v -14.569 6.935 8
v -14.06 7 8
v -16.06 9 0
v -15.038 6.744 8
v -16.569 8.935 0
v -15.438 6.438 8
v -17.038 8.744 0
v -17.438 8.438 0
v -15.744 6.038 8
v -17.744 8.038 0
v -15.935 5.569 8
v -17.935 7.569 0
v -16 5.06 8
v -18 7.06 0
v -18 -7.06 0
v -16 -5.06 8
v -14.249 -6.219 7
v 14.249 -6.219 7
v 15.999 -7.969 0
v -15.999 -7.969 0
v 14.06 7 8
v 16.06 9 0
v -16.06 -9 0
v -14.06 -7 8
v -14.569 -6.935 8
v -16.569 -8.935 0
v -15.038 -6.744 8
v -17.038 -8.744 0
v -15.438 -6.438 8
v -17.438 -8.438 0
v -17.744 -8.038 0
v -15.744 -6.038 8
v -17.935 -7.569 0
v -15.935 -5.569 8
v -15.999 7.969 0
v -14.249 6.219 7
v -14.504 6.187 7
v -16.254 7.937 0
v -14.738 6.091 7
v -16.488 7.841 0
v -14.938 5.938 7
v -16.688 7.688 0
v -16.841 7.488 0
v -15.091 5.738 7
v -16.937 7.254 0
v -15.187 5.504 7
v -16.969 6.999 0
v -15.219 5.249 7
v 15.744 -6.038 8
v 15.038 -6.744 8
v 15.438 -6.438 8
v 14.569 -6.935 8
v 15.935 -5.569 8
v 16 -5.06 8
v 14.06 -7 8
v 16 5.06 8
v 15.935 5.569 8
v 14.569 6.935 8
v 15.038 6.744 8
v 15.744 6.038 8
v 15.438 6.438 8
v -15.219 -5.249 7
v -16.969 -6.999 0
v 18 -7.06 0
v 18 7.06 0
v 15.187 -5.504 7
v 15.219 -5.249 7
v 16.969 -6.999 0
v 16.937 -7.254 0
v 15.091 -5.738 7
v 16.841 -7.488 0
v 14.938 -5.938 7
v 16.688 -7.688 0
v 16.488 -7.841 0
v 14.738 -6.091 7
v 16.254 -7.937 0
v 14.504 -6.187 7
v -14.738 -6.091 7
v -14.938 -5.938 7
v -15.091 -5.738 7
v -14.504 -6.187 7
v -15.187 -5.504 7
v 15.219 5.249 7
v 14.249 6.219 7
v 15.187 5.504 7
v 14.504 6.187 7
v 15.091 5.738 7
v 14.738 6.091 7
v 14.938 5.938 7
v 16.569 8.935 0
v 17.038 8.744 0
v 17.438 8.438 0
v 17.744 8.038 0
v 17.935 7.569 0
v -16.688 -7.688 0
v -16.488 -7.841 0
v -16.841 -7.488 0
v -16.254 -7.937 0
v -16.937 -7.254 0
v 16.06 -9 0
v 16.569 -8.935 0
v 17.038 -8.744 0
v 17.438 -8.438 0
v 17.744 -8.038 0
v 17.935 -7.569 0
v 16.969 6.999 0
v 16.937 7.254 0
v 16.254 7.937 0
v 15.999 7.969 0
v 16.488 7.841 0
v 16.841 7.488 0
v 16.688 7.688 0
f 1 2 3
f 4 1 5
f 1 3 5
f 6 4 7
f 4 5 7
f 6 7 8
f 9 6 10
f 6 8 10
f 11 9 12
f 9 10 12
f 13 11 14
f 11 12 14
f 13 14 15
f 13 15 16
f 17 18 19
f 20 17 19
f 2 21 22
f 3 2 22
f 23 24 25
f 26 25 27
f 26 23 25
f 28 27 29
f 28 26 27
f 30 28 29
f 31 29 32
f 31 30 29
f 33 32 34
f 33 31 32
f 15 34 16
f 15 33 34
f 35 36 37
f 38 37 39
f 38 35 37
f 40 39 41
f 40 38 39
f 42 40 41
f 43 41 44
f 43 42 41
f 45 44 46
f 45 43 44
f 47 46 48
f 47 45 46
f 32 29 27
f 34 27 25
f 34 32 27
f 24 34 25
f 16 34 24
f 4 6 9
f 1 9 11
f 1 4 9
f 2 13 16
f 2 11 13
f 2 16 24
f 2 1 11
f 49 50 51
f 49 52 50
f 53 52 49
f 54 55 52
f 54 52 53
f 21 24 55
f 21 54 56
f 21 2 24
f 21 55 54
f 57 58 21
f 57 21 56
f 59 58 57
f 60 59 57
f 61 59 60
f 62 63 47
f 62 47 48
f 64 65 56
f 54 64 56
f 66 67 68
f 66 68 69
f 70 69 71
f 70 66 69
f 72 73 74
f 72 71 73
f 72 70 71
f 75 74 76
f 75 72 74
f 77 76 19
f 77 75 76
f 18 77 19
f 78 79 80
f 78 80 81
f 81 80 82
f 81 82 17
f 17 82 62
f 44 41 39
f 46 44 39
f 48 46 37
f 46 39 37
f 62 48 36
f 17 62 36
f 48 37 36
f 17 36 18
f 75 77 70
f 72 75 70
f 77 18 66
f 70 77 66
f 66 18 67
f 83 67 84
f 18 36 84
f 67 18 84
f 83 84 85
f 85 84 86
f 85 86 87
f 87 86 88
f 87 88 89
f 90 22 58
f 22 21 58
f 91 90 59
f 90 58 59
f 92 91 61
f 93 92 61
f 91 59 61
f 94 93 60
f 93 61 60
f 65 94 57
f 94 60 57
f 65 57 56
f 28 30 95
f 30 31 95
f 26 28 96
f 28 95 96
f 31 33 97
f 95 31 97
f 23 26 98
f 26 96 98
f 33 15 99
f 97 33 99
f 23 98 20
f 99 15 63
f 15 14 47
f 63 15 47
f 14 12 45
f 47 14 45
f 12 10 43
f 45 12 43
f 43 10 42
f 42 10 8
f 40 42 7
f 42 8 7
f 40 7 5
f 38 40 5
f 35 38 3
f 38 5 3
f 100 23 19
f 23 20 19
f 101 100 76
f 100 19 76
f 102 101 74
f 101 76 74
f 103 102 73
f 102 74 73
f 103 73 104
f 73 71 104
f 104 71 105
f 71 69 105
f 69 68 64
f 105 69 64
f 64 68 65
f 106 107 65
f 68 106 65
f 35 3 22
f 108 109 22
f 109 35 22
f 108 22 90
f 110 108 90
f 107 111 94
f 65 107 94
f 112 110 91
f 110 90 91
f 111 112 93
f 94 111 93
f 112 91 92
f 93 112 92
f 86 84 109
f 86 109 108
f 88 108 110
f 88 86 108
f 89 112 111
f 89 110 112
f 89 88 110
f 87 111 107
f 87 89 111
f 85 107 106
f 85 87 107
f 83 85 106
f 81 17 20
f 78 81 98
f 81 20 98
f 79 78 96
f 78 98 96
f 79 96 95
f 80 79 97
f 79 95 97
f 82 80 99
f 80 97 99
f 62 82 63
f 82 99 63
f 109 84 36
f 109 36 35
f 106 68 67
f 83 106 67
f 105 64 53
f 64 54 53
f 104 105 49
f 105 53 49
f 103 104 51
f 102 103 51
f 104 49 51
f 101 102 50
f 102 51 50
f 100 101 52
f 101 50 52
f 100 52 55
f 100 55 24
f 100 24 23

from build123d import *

# Parameters (mm, degrees)
SKETCH_W             = 36
SKETCH_H             = 18
PAD_DEPTH            = 8
POCKET_DEPTH         = 18.001
POCKET001_DEPTH      = 18.001
POCKET001_DEPTH_BACK = 18.001
FILLET_R             = 2
THICKNESS_T          = -1


with BuildPart() as part:
    # Sketch → Pad (new body)
    with BuildSketch(Plane.XY):
        Rectangle(SKETCH_W, SKETCH_H)
    extrude(amount=PAD_DEPTH)

    # Sketch001 (on Face1 of Pad) → Pocket (cut, through all)
    with BuildSketch(Plane.XZ.offset(9)):
        Polygon((-18, 8), (-18, 0), (-16, 8), align=None)
        Polygon((18, 8), (18, 0), (16, 8), align=None)
    extrude(amount=-POCKET_DEPTH, mode=Mode.SUBTRACT)

    # Sketch002 → Pocket001 (cut, two sides)
    with BuildSketch(Plane.YZ) as pocket001_sk:
        Polygon((-9, 8), (-7, 8), (-9, 0), align=None)
        Polygon((9, 8), (7, 8), (9, 0), align=None)
    extrude(amount=-POCKET001_DEPTH, mode=Mode.SUBTRACT)
    extrude(pocket001_sk.sketch, amount=POCKET001_DEPTH_BACK, mode=Mode.SUBTRACT)

    # Fillet
    fillet_edges = [part.edges().sort_by_distance(p)[0] for p in [
        (-17, 8, 4),
        (-17, -8, 4),
        (17, -8, 4),
        (17, 8, 4),
    ]]
    fillet(fillet_edges, radius=FILLET_R)

    # Thickness
    thickness_openings = [part.faces().sort_by_distance(p)[0] for p in [
        (0, 0, 0),
    ]]
    offset(amount=THICKNESS_T, openings=thickness_openings, kind=Kind.INTERSECTION)


solid = part.part
